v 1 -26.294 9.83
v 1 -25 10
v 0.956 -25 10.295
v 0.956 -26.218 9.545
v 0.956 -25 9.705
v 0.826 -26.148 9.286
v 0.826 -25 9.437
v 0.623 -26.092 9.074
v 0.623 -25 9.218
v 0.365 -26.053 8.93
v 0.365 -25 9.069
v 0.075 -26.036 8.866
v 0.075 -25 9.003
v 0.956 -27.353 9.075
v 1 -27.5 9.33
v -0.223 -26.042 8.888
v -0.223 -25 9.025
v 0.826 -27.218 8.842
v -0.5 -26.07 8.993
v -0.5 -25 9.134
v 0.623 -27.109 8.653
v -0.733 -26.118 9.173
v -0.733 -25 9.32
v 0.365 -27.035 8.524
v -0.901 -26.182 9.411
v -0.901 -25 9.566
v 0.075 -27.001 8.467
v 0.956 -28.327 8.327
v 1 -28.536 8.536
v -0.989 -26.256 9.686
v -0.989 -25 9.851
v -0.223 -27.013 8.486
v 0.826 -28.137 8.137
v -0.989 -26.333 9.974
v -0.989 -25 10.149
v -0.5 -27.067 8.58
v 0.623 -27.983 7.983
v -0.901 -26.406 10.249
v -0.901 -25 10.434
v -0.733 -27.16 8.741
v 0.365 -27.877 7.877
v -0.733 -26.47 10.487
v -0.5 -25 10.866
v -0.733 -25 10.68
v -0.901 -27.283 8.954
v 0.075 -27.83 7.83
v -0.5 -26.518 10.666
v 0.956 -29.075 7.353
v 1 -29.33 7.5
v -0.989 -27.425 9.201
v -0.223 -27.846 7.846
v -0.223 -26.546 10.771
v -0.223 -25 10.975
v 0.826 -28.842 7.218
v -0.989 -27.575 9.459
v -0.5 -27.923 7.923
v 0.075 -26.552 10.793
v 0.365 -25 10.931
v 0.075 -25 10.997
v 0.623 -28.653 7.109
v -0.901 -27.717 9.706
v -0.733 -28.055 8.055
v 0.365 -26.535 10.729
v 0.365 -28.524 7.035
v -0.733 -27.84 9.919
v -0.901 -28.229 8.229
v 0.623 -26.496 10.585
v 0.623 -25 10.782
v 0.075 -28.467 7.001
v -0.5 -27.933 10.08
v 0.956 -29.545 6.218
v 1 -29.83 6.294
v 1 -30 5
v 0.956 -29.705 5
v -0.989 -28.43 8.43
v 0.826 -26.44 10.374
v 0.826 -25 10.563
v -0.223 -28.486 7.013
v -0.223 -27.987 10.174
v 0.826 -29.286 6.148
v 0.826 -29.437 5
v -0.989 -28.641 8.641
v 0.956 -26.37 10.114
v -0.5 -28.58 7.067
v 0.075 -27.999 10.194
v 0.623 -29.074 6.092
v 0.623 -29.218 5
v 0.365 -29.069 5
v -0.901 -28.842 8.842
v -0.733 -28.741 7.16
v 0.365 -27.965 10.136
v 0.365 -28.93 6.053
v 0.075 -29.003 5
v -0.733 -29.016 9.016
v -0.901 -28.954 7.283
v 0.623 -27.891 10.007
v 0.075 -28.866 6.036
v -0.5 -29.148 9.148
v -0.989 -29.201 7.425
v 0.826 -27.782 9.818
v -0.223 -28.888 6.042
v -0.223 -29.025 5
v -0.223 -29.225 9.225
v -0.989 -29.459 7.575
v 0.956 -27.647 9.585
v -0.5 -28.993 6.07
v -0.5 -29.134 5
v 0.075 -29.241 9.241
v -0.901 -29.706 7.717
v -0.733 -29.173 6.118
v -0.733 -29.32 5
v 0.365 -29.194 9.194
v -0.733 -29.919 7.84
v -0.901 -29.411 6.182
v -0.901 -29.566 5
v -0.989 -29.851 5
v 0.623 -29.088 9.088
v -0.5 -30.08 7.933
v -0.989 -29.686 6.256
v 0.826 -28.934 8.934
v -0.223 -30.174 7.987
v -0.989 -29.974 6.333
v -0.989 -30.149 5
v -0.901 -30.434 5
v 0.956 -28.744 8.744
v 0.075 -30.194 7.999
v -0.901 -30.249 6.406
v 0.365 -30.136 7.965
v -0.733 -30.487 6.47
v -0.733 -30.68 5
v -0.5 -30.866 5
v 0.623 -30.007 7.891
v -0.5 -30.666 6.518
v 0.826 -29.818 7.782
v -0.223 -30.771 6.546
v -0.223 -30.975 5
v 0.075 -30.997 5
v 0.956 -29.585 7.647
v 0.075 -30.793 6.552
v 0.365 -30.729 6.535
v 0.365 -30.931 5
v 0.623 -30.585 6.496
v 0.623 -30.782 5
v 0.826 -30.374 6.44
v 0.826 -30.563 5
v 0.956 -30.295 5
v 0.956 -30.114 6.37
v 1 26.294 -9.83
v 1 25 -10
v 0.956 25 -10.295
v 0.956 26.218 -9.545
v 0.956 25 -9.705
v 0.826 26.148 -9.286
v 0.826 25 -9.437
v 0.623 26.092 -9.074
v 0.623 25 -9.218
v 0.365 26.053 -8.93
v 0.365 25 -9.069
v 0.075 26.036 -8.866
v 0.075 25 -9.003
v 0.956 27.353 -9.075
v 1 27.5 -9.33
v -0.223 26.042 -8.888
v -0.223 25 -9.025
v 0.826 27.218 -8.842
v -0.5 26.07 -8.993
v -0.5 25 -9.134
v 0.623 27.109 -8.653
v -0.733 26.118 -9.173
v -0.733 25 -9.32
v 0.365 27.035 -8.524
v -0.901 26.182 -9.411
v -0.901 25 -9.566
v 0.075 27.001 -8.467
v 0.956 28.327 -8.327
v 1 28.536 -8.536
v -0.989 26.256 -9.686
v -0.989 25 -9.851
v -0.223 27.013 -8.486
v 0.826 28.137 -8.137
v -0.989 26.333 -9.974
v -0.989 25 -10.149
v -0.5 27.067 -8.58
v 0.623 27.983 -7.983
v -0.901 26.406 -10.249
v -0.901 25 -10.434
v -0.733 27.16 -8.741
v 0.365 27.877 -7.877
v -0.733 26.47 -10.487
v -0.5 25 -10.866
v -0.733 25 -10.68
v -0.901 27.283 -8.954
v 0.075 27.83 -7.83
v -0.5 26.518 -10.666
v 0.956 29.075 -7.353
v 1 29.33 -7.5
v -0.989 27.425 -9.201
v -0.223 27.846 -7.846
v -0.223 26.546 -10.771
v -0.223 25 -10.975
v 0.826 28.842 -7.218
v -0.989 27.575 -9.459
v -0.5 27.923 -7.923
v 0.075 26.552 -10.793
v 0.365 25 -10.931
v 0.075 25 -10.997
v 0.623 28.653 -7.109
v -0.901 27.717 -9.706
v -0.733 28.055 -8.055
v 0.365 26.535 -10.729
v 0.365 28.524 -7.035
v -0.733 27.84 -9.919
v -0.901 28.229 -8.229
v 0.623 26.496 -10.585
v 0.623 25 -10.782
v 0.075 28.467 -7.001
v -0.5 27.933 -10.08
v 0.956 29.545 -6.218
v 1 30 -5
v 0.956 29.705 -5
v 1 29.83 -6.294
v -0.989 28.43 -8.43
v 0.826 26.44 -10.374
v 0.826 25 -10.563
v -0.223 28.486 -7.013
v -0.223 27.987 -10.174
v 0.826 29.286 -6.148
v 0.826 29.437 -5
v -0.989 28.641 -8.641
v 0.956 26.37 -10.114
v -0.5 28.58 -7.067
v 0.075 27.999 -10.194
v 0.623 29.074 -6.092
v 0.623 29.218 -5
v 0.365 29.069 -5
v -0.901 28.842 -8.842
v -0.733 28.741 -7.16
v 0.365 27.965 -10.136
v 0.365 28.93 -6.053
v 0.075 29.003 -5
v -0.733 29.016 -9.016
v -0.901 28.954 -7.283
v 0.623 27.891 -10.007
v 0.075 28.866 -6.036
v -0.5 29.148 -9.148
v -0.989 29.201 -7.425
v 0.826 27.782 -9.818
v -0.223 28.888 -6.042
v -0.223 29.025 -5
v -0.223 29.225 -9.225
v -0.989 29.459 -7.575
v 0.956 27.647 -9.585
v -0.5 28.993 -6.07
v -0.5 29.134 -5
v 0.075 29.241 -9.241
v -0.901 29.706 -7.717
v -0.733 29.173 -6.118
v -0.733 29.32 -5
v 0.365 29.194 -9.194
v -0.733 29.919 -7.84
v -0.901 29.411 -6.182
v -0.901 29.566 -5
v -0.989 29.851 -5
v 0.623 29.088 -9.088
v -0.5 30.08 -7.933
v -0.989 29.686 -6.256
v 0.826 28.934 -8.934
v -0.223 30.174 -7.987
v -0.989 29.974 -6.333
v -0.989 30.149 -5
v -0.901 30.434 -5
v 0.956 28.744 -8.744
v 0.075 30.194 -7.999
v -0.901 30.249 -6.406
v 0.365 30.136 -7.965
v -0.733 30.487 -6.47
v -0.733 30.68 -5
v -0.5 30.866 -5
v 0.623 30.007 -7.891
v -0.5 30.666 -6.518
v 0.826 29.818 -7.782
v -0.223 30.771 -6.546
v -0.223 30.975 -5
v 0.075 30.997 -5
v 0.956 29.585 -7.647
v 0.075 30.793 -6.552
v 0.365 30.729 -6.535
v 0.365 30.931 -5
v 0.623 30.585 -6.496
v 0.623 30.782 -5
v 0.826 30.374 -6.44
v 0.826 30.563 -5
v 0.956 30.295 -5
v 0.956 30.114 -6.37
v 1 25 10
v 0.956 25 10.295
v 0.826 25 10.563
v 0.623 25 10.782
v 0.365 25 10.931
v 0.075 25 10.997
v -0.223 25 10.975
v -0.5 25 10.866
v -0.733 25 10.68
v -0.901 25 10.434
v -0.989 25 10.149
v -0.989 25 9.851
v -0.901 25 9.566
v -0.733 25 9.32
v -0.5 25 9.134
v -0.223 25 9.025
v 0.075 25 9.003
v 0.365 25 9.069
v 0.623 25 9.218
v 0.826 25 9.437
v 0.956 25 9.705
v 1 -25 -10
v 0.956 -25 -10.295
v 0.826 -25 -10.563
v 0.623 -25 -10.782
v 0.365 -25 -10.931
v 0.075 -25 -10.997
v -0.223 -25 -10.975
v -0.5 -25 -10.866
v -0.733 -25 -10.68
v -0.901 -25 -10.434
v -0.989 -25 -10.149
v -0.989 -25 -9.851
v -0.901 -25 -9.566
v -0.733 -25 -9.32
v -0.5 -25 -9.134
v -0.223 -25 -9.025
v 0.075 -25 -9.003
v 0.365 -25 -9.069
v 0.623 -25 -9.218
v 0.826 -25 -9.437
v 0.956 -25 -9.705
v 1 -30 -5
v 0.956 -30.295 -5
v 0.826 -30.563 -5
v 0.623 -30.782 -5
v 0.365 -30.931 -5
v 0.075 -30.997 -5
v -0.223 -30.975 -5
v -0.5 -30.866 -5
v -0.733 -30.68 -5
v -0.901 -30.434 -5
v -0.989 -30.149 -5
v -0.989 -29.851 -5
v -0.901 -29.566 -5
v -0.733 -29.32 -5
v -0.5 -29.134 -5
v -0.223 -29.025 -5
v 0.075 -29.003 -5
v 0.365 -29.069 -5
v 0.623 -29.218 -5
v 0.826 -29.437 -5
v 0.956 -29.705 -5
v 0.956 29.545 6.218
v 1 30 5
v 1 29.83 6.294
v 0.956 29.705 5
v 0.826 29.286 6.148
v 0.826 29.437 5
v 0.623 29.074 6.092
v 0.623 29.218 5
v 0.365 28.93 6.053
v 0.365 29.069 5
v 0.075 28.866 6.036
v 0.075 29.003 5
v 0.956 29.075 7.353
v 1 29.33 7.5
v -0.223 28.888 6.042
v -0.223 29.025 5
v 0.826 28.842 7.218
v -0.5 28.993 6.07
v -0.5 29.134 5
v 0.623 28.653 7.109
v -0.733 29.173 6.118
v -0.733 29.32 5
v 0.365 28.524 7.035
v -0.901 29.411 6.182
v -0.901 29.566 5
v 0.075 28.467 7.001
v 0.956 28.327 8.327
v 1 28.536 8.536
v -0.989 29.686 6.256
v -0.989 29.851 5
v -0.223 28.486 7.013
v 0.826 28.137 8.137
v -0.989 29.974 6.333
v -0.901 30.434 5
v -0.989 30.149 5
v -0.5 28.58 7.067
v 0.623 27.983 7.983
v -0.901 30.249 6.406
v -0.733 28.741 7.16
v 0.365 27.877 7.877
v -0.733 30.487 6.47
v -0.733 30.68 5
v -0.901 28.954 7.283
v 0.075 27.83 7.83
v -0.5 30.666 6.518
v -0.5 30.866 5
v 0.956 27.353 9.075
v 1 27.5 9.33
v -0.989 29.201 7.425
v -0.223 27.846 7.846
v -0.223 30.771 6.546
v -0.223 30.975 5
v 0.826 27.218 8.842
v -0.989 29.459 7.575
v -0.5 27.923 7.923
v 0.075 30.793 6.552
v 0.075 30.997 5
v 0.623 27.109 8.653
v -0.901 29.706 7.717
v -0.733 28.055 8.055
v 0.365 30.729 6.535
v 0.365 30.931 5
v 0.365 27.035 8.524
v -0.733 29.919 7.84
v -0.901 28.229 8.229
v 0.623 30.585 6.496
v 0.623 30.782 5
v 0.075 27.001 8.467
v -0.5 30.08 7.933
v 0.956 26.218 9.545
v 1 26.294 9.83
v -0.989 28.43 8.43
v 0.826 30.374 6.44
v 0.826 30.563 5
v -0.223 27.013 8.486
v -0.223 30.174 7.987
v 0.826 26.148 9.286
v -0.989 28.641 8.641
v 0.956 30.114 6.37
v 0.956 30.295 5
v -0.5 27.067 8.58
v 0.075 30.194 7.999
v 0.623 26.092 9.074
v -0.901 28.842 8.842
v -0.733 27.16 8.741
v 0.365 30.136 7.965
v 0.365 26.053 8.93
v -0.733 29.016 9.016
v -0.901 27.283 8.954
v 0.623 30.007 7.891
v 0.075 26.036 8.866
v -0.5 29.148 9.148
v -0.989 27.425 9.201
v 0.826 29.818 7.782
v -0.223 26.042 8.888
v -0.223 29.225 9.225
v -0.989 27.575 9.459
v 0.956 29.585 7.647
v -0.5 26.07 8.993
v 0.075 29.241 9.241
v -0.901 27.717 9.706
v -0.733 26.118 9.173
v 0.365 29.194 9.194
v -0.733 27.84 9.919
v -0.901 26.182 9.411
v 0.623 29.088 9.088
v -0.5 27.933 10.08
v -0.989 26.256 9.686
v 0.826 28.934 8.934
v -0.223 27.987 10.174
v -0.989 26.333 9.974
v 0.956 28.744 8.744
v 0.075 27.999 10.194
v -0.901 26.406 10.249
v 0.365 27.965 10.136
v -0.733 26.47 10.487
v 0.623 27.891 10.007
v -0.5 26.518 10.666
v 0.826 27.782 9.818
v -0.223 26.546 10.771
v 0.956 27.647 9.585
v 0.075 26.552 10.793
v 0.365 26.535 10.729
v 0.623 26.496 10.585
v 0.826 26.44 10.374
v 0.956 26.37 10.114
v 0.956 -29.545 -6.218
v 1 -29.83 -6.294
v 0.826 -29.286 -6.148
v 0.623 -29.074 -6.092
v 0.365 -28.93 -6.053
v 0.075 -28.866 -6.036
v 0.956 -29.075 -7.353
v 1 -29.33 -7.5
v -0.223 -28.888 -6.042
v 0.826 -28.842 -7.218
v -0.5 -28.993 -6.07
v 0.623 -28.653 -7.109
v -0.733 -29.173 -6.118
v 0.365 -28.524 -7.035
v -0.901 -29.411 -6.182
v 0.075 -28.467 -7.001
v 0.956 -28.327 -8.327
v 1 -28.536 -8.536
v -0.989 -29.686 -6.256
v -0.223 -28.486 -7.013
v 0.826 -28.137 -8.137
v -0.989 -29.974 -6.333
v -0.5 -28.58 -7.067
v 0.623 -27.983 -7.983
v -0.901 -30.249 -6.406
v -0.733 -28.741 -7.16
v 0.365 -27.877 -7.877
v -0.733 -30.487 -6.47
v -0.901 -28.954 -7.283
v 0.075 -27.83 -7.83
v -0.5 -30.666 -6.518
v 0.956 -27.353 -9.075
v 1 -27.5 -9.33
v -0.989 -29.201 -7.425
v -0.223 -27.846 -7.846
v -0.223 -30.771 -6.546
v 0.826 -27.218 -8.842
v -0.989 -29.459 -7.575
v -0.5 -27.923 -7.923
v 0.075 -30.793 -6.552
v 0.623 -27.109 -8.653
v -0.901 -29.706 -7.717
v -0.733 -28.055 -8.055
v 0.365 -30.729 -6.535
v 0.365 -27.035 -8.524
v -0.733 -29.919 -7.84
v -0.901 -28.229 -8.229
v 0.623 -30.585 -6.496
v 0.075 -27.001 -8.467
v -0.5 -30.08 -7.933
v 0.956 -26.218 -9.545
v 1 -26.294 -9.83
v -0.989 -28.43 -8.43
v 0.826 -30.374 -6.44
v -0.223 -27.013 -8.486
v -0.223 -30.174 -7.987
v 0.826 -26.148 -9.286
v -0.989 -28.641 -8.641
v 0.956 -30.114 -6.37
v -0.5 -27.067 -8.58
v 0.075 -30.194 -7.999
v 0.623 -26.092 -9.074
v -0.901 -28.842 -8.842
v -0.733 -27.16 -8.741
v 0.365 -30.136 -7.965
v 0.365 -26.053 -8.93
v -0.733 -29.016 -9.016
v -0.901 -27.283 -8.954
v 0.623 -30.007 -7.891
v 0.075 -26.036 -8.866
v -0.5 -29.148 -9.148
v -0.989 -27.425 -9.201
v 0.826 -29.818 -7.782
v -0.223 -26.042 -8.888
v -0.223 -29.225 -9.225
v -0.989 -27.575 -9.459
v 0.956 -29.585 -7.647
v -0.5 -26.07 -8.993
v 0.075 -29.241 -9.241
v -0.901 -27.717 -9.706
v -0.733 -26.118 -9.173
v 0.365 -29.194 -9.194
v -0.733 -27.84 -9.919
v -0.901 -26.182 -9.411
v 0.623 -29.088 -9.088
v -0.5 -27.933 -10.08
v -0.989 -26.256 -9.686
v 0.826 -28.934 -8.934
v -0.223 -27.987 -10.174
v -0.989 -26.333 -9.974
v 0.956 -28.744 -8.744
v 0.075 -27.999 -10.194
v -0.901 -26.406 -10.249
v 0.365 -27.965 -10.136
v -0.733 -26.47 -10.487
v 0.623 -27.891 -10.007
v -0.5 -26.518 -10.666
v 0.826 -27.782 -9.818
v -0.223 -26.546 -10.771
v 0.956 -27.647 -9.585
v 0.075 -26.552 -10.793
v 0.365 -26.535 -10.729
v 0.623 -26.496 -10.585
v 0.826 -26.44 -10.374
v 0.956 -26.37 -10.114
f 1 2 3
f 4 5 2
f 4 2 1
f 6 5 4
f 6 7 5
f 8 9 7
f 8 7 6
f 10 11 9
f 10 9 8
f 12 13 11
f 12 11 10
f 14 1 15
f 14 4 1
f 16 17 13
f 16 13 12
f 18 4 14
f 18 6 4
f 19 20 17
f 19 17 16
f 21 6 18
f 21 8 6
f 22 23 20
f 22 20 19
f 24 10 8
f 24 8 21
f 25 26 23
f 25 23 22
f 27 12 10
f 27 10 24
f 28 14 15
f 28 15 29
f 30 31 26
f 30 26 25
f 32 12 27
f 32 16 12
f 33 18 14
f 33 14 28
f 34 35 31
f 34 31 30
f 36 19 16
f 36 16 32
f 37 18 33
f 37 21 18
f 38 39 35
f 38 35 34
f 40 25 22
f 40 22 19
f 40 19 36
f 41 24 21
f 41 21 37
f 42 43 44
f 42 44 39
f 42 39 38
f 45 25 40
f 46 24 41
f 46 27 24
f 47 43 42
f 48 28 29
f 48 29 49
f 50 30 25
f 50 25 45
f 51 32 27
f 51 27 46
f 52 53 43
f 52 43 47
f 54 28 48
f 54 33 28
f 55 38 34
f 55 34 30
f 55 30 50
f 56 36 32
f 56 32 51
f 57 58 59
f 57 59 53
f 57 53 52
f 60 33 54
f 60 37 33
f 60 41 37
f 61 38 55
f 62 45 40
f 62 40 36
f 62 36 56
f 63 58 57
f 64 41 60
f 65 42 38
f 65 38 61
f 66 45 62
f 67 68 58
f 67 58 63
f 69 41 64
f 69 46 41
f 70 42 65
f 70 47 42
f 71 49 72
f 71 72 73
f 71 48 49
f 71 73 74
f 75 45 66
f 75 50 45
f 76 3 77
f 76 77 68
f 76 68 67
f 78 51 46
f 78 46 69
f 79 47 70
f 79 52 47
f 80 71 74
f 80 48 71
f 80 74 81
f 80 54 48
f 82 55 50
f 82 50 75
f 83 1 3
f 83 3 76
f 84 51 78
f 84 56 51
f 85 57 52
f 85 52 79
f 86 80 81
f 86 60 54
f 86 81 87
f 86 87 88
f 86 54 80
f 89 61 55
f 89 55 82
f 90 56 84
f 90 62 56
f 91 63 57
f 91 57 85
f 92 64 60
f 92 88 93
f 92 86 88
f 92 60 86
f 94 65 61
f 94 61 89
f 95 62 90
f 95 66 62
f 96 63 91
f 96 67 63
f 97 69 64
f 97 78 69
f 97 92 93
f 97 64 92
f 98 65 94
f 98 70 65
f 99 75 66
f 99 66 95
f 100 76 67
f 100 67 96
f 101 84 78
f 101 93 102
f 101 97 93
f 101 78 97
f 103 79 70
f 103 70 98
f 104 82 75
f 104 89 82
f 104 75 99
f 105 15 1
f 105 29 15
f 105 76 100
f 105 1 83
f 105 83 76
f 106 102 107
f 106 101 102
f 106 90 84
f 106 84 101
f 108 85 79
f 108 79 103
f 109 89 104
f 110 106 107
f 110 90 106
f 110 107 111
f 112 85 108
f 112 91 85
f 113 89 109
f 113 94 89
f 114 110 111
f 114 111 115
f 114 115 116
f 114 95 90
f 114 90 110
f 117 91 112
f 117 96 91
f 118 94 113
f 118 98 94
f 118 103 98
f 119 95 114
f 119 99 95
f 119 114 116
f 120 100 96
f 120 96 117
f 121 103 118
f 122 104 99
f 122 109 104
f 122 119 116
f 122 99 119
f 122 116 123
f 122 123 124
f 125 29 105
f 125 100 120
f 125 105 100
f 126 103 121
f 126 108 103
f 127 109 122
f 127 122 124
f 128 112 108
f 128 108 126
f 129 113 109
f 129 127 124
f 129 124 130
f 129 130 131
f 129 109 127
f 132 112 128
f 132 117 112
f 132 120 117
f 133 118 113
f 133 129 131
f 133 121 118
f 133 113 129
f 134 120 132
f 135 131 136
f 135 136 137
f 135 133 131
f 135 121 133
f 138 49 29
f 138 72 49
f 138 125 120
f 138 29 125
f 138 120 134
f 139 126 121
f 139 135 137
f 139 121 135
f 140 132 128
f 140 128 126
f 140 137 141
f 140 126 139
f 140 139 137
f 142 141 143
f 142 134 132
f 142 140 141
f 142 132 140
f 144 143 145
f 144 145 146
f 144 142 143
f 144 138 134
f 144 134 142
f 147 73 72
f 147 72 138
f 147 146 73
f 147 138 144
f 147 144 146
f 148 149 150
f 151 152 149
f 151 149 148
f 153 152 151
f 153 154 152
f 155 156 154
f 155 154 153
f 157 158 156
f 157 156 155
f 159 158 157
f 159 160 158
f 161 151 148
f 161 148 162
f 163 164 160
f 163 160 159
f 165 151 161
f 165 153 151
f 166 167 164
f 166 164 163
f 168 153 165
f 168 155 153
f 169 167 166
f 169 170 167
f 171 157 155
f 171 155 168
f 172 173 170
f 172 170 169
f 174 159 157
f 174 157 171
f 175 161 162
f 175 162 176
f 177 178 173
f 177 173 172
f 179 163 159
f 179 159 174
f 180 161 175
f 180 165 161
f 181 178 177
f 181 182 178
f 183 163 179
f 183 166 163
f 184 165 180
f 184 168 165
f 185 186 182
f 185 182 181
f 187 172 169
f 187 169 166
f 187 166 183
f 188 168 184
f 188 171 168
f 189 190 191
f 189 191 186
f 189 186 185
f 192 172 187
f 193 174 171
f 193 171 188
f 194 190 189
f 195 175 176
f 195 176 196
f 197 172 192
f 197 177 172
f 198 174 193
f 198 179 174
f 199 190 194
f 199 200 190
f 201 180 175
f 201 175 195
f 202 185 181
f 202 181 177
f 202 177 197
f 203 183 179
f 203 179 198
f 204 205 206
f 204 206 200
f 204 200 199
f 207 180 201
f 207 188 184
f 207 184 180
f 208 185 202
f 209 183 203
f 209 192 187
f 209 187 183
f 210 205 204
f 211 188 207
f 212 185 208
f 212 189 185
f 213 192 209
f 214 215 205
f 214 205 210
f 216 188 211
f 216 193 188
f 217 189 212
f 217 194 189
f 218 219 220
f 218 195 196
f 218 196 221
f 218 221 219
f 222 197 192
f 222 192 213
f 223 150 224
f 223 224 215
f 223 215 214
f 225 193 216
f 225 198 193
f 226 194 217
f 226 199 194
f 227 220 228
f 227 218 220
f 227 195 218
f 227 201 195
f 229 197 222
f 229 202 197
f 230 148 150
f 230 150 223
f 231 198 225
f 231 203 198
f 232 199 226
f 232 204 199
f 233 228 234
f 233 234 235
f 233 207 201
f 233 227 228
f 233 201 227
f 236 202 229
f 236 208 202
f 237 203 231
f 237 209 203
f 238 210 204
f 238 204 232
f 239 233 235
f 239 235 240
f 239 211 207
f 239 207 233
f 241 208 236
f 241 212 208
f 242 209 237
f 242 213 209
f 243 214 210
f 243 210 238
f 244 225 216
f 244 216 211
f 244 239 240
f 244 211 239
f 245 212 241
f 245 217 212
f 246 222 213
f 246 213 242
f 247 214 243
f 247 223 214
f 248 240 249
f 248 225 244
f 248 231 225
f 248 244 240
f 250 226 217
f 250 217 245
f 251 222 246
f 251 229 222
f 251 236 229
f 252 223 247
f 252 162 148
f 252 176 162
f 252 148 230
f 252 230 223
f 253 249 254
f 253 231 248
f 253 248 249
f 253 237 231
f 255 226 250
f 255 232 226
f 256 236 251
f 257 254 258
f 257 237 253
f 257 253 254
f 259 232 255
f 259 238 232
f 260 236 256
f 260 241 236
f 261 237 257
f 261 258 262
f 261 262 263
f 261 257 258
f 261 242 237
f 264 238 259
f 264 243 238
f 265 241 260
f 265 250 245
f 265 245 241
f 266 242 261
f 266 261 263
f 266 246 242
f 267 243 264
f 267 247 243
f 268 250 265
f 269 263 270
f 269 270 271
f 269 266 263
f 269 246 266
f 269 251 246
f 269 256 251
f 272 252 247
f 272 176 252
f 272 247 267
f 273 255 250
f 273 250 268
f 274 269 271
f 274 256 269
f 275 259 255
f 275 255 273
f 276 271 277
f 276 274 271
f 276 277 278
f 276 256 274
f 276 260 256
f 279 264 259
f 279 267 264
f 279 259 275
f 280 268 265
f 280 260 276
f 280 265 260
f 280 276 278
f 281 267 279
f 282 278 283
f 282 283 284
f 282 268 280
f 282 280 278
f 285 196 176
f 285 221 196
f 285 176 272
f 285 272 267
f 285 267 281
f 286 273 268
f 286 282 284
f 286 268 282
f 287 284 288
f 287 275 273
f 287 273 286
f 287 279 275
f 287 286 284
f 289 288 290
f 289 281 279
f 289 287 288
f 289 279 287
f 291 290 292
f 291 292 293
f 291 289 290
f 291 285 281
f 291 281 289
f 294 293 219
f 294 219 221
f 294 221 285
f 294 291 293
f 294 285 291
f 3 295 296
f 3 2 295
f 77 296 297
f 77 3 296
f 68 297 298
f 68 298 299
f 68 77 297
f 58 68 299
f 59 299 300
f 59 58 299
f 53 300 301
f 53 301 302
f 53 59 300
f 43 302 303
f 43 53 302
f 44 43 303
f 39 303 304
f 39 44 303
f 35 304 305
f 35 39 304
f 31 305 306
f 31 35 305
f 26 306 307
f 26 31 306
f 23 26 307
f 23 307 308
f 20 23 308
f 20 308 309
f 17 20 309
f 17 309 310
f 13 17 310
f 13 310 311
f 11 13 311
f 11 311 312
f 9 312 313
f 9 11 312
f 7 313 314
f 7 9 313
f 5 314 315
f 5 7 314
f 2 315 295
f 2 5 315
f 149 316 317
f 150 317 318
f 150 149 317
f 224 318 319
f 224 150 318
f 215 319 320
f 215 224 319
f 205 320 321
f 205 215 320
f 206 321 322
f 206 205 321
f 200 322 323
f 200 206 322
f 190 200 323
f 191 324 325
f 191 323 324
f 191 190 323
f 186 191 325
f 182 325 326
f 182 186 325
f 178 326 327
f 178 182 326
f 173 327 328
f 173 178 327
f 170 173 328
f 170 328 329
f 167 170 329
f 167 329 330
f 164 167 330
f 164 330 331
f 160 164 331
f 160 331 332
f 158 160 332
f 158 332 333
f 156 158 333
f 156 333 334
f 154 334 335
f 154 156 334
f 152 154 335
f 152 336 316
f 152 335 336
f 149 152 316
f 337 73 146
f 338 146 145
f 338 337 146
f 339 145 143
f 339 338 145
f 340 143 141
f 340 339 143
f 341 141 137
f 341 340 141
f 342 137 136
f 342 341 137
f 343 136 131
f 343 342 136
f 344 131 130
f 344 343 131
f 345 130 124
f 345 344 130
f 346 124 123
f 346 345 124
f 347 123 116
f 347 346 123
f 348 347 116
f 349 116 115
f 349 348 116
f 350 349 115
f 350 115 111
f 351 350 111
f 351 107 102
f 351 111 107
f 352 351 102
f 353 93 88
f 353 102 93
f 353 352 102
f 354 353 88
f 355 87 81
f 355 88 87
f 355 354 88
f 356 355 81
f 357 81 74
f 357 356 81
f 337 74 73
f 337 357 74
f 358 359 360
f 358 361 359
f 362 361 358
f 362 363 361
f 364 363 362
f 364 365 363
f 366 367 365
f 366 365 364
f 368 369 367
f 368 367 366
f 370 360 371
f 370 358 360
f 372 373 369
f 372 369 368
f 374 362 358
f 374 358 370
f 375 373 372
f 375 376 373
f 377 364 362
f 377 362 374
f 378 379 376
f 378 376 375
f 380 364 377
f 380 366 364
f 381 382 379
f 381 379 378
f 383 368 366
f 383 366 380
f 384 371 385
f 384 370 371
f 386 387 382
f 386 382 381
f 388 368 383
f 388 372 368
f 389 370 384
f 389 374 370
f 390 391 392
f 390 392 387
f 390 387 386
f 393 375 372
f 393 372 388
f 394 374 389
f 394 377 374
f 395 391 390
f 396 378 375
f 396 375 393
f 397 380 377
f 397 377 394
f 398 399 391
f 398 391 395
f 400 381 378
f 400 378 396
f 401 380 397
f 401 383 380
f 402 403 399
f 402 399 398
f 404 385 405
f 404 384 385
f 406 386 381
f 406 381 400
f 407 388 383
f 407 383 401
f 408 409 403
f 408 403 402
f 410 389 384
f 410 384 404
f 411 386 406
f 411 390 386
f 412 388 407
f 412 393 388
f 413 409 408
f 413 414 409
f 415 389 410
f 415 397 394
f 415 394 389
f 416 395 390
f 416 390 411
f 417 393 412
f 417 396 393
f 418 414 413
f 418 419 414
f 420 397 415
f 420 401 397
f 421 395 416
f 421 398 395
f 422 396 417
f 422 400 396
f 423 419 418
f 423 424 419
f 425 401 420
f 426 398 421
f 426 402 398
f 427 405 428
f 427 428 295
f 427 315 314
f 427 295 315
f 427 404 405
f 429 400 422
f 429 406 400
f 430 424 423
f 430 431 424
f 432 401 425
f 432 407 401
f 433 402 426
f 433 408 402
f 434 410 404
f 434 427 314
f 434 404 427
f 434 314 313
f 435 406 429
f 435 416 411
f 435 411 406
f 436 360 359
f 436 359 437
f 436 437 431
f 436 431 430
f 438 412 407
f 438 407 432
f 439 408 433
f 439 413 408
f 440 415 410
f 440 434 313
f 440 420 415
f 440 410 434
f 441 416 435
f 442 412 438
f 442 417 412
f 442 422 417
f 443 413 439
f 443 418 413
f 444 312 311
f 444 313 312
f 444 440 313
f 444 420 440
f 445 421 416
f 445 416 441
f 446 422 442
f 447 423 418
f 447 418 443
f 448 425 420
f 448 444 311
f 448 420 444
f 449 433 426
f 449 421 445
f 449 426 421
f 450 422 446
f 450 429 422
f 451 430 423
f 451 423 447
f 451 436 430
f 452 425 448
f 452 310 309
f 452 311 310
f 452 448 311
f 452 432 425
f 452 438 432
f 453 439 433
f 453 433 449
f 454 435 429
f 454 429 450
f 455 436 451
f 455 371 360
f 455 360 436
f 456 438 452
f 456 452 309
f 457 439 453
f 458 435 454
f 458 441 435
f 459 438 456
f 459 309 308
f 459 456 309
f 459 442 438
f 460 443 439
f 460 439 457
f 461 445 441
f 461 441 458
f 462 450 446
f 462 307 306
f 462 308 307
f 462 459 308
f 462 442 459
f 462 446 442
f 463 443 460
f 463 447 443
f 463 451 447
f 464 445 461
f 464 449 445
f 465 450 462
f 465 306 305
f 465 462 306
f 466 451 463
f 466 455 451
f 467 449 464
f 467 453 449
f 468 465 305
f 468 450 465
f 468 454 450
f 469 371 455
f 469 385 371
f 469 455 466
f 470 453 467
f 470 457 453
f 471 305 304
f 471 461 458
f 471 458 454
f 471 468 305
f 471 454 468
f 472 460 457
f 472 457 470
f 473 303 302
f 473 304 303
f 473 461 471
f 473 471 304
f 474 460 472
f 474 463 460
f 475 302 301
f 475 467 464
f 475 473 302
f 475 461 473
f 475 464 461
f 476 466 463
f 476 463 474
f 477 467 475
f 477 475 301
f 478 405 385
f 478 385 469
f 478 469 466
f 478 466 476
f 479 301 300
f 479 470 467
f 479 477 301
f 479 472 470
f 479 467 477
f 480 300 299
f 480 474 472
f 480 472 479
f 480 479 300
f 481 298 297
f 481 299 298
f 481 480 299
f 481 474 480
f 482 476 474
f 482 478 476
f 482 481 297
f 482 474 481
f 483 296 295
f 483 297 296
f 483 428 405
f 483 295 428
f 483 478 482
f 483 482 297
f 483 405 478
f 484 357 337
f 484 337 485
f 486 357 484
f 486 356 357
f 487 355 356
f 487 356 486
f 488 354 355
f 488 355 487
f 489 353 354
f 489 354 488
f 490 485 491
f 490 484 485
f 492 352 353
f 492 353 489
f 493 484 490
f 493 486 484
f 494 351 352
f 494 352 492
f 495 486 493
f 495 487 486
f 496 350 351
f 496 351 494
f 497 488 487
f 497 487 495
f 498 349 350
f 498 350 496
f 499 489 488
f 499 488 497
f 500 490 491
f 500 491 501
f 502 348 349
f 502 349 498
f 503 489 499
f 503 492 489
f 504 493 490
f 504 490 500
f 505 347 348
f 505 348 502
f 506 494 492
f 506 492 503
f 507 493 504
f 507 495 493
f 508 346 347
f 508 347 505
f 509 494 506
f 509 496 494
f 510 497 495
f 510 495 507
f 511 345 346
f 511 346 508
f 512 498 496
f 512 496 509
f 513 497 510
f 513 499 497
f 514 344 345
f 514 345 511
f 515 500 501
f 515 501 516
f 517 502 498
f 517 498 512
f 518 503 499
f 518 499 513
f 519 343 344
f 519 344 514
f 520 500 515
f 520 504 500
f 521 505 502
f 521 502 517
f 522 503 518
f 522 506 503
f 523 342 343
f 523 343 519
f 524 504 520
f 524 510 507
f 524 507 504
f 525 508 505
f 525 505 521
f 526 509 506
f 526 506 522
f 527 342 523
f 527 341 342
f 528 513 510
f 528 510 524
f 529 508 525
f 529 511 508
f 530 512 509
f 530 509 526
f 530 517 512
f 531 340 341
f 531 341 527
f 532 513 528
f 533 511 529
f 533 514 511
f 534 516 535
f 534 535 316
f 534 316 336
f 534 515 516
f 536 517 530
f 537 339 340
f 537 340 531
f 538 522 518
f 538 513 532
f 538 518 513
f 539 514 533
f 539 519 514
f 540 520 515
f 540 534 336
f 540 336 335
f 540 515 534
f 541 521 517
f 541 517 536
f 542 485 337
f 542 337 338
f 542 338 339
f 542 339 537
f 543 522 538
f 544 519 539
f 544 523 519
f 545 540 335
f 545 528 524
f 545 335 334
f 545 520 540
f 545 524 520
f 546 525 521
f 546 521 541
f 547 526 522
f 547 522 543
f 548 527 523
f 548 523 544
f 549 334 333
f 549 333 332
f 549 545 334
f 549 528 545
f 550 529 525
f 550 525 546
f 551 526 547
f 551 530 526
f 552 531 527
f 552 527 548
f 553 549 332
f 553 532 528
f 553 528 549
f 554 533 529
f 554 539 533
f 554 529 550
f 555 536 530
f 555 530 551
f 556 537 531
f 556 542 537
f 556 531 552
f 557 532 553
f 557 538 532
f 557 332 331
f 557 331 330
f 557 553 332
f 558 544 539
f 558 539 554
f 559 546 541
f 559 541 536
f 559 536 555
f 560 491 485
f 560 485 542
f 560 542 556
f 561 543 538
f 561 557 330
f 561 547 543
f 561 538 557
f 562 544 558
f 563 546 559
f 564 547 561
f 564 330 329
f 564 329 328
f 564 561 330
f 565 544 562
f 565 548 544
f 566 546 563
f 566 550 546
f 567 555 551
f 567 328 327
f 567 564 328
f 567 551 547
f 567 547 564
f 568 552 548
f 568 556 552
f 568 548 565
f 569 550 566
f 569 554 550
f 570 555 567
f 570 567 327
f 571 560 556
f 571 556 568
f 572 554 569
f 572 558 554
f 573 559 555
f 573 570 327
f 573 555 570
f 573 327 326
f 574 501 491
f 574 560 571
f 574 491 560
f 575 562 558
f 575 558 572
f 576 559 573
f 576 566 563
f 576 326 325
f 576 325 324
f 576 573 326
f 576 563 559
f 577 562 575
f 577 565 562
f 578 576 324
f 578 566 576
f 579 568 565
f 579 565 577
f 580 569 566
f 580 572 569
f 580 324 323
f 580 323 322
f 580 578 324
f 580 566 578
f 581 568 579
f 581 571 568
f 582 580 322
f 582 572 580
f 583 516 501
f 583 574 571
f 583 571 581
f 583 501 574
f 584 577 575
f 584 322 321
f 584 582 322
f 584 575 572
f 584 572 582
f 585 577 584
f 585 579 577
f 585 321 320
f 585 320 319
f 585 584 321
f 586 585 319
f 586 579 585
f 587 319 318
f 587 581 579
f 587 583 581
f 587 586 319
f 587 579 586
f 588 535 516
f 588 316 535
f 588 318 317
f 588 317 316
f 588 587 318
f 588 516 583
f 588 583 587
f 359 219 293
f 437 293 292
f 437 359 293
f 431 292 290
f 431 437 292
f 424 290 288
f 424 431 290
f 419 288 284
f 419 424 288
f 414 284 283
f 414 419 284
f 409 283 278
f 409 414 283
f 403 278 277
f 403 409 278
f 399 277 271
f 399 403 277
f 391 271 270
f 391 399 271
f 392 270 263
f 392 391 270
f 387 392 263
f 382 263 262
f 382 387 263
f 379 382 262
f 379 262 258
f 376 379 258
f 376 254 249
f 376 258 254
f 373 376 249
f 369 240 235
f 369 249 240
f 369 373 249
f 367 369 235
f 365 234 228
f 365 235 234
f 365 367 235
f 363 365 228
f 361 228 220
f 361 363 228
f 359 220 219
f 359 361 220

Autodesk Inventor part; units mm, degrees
ref_plane "YZ Plane" through (0, 0, 0) normal (1, 0, 0) x (0, 1, 0)
ref_plane "XZ Plane" through (0, 0, 0) normal (0, 1, 0) x (-1, 0, 0)
ref_plane "XY Plane" through (0, 0, 0) normal (0, 0, 1) x (1, 0, 0)
sketch "Sketch1" plane through (0, 0, 0) normal (1, 0, 0) x (0, 1, 0)
  line L0 (25, 10) -> (-25, 10)
  line L1 (-30, 5) -> (-30, -5)
  line L2 (-25, -10) -> (25, -10)
  line L3 (30, -5) -> (30, 5)
  line L4 (30, 10) -> (-30, -10) construction
  line L5 (-30, 10) -> (30, -10) construction
  arc A0 (30, 5) -> (25, 10) centre (25, 5) ccw
  arc A1 (25, -10) -> (30, -5) centre (25, -5) ccw
  arc A2 (-30, -5) -> (-25, -10) centre (-25, -5) ccw
  arc A3 (-25, 10) -> (-30, 5) centre (-25, 5) ccw
  point P0 (0, 0)
  dimension "d0" = 60
  dimension "d1" = 20
  dimension "d2" = 5
sketch "Sketch3" plane through (0, 0, 0) normal (0, 0, 1) x (1, 0, 0)
  circle A0 centre (0, 30) radius 1
  point P0 (0, 0)
  dimension "d4" = 2
sweep "Sweep1" add profiles "Sketch3" path "Sketch1"
properties part number "Mock String"
